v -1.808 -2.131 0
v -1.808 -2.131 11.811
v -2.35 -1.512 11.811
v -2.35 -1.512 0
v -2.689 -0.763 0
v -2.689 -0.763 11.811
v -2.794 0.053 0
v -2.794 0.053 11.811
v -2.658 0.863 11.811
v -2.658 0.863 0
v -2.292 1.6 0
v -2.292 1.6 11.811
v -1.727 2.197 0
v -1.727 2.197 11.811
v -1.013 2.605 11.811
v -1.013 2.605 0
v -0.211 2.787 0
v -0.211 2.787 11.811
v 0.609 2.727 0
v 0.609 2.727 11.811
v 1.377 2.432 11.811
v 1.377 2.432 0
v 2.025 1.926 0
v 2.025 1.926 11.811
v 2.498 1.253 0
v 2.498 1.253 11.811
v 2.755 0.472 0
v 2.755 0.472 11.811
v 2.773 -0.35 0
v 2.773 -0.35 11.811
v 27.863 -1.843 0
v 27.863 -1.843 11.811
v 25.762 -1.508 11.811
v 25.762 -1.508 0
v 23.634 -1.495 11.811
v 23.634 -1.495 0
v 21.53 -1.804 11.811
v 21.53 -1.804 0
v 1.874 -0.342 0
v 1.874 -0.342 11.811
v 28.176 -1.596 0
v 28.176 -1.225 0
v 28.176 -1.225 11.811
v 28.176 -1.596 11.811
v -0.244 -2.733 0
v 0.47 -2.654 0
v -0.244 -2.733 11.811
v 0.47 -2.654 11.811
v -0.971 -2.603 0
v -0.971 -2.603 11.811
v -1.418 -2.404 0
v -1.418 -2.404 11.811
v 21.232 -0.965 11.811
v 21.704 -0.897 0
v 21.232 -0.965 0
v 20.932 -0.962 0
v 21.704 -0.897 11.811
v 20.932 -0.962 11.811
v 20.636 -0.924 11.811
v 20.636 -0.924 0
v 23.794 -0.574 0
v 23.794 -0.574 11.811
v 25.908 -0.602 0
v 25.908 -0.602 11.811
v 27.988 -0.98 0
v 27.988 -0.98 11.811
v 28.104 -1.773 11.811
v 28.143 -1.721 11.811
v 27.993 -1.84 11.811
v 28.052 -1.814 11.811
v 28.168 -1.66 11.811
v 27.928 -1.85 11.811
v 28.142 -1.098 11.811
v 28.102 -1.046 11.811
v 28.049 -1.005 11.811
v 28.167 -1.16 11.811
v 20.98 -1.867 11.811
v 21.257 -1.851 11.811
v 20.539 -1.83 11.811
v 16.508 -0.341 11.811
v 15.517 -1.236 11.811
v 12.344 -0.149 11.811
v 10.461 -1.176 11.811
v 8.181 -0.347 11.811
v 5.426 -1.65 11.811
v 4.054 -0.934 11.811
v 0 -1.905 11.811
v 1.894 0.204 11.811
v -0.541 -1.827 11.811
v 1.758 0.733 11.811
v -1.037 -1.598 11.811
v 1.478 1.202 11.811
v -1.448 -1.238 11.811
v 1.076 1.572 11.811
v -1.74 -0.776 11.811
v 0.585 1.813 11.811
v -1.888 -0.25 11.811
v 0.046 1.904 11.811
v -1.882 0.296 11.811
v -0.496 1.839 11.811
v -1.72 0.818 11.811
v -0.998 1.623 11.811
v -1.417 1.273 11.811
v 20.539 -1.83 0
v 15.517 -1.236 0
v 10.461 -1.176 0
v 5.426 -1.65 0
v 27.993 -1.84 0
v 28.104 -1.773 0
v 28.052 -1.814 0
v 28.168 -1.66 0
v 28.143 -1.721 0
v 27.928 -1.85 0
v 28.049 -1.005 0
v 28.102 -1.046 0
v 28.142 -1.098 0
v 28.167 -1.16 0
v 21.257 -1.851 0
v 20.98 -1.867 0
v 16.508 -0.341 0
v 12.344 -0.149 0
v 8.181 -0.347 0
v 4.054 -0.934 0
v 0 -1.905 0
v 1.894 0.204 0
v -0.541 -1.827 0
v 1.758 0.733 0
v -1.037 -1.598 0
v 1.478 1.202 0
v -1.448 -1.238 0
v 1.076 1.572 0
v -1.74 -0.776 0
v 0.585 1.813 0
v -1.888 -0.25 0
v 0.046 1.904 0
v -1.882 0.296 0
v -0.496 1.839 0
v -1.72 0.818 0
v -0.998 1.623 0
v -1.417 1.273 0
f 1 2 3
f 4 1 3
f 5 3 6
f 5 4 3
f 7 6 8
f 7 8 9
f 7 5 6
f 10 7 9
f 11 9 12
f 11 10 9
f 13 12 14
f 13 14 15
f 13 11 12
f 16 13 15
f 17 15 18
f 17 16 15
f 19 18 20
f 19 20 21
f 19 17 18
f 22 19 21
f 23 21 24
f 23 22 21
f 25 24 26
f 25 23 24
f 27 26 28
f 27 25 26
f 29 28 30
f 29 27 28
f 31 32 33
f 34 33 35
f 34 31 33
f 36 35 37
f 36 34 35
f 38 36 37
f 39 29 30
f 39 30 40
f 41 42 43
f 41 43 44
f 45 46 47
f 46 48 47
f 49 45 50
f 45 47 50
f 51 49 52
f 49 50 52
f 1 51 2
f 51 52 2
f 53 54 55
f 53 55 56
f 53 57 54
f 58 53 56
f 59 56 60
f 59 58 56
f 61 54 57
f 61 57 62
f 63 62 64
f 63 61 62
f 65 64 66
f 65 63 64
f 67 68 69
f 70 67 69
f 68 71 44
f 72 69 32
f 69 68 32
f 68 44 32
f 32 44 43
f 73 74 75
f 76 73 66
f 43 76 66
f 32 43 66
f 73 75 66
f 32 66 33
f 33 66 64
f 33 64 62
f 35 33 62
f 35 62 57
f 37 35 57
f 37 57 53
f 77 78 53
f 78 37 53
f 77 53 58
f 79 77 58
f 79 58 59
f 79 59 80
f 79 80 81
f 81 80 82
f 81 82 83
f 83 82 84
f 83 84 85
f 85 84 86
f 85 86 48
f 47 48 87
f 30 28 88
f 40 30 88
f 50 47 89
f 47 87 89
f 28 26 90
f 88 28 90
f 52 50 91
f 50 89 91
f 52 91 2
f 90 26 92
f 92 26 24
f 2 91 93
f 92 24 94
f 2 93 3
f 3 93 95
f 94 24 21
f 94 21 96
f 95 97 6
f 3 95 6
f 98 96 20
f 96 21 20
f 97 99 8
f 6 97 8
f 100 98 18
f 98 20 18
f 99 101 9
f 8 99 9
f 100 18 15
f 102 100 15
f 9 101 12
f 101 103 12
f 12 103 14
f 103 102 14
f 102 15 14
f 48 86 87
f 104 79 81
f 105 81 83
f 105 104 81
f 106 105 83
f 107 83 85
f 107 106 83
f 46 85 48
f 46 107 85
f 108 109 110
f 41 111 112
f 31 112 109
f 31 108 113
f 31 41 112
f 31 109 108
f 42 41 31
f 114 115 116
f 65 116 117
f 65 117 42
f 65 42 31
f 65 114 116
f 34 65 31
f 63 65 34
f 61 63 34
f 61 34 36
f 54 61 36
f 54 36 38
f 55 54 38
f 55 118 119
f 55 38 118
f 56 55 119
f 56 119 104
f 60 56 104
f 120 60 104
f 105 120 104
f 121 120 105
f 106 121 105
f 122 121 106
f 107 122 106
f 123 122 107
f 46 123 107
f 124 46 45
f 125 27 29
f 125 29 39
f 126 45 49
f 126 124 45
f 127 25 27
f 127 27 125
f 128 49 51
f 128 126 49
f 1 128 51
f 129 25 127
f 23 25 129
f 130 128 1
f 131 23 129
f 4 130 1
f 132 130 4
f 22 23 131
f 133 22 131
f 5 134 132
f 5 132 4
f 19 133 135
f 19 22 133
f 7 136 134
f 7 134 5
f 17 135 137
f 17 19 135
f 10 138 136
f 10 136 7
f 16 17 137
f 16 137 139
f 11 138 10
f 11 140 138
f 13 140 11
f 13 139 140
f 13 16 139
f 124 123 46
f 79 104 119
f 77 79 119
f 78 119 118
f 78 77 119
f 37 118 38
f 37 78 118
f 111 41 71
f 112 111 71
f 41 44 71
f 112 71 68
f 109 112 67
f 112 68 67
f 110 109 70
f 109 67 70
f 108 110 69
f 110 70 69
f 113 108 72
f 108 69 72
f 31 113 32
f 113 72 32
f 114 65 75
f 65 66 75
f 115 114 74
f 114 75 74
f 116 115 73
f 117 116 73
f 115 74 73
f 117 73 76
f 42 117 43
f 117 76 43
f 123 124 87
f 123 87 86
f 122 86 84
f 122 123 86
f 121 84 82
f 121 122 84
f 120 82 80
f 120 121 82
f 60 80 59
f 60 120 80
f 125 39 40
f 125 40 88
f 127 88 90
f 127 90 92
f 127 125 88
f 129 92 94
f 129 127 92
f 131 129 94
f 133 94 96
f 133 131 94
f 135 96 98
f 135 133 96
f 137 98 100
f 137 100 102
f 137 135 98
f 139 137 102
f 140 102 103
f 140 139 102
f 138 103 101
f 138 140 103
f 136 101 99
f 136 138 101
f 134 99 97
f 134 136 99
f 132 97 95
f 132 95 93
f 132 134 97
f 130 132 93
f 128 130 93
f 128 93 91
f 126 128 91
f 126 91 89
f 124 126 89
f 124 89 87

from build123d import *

# Parameters (mm, degrees)
BOSS_EXTRUDE1_DEPTH = 11.811
FILLET1_R           = 2.54
FILLET2_R           = 2.54
FILLET3_R           = 2.54
FILLET4_R           = 0.254


with BuildPart() as part:
    # Sketch1 → Boss-Extrude1 (new body)
    with BuildSketch(Plane.XY):
        with BuildLine():
            Line((28.176033565, -1.032201382), (28.176033565, -1.921201382))
            ThreePointArc((28.176033565, -1.921201382), (24.613856271, -1.460610767), (21.051678976, -1.921201382))
            ThreePointArc((21.051678976, -1.921201382), (10.446405641, -1.176341171), (-0.061202039, -2.794))
            ThreePointArc((-0.061202039, -2.794), (-1.825200311, 2.116323585), (2.772672487, -0.349955666))
            Line((2.772672487, -0.349955666), (1.874071212, -0.34188023))
            ThreePointArc((1.874071212, -0.34188023), (-1.220193255, 1.462926321), (0, -1.905))
            ThreePointArc((0, -1.905), (10.542698007, -0.186192099), (21.191033565, -1.032201382))
            ThreePointArc((21.191033565, -1.032201382), (24.683533565, -0.542543055), (28.176033565, -1.032201382))
        make_face()
    extrude(amount=BOSS_EXTRUDE1_DEPTH)

    # Fillet1
    fillet1_edges = [part.edges().sort_by_distance(p)[0] for p in [
        (-0.061202039, -2.794, 5.9055),
    ]]
    fillet(fillet1_edges, radius=FILLET1_R)

    # Fillet2
    fillet2_edges = [part.edges().sort_by_distance(p)[0] for p in [
        (21.051678976, -1.921201382, 5.9055),
    ]]
    fillet(fillet2_edges, radius=FILLET2_R)

    # Fillet3
    fillet3_edges = [part.edges().sort_by_distance(p)[0] for p in [
        (21.191033565, -1.032201382, 5.9055),
    ]]
    fillet(fillet3_edges, radius=FILLET3_R)

    # Fillet4
    fillet4_edges = [part.edges().sort_by_distance(p)[0] for p in [
        (28.176033565, -1.032201382, 5.9055),
        (28.176033565, -1.921201382, 5.9055),
    ]]
    fillet(fillet4_edges, radius=FILLET4_R)


solid = part.part
